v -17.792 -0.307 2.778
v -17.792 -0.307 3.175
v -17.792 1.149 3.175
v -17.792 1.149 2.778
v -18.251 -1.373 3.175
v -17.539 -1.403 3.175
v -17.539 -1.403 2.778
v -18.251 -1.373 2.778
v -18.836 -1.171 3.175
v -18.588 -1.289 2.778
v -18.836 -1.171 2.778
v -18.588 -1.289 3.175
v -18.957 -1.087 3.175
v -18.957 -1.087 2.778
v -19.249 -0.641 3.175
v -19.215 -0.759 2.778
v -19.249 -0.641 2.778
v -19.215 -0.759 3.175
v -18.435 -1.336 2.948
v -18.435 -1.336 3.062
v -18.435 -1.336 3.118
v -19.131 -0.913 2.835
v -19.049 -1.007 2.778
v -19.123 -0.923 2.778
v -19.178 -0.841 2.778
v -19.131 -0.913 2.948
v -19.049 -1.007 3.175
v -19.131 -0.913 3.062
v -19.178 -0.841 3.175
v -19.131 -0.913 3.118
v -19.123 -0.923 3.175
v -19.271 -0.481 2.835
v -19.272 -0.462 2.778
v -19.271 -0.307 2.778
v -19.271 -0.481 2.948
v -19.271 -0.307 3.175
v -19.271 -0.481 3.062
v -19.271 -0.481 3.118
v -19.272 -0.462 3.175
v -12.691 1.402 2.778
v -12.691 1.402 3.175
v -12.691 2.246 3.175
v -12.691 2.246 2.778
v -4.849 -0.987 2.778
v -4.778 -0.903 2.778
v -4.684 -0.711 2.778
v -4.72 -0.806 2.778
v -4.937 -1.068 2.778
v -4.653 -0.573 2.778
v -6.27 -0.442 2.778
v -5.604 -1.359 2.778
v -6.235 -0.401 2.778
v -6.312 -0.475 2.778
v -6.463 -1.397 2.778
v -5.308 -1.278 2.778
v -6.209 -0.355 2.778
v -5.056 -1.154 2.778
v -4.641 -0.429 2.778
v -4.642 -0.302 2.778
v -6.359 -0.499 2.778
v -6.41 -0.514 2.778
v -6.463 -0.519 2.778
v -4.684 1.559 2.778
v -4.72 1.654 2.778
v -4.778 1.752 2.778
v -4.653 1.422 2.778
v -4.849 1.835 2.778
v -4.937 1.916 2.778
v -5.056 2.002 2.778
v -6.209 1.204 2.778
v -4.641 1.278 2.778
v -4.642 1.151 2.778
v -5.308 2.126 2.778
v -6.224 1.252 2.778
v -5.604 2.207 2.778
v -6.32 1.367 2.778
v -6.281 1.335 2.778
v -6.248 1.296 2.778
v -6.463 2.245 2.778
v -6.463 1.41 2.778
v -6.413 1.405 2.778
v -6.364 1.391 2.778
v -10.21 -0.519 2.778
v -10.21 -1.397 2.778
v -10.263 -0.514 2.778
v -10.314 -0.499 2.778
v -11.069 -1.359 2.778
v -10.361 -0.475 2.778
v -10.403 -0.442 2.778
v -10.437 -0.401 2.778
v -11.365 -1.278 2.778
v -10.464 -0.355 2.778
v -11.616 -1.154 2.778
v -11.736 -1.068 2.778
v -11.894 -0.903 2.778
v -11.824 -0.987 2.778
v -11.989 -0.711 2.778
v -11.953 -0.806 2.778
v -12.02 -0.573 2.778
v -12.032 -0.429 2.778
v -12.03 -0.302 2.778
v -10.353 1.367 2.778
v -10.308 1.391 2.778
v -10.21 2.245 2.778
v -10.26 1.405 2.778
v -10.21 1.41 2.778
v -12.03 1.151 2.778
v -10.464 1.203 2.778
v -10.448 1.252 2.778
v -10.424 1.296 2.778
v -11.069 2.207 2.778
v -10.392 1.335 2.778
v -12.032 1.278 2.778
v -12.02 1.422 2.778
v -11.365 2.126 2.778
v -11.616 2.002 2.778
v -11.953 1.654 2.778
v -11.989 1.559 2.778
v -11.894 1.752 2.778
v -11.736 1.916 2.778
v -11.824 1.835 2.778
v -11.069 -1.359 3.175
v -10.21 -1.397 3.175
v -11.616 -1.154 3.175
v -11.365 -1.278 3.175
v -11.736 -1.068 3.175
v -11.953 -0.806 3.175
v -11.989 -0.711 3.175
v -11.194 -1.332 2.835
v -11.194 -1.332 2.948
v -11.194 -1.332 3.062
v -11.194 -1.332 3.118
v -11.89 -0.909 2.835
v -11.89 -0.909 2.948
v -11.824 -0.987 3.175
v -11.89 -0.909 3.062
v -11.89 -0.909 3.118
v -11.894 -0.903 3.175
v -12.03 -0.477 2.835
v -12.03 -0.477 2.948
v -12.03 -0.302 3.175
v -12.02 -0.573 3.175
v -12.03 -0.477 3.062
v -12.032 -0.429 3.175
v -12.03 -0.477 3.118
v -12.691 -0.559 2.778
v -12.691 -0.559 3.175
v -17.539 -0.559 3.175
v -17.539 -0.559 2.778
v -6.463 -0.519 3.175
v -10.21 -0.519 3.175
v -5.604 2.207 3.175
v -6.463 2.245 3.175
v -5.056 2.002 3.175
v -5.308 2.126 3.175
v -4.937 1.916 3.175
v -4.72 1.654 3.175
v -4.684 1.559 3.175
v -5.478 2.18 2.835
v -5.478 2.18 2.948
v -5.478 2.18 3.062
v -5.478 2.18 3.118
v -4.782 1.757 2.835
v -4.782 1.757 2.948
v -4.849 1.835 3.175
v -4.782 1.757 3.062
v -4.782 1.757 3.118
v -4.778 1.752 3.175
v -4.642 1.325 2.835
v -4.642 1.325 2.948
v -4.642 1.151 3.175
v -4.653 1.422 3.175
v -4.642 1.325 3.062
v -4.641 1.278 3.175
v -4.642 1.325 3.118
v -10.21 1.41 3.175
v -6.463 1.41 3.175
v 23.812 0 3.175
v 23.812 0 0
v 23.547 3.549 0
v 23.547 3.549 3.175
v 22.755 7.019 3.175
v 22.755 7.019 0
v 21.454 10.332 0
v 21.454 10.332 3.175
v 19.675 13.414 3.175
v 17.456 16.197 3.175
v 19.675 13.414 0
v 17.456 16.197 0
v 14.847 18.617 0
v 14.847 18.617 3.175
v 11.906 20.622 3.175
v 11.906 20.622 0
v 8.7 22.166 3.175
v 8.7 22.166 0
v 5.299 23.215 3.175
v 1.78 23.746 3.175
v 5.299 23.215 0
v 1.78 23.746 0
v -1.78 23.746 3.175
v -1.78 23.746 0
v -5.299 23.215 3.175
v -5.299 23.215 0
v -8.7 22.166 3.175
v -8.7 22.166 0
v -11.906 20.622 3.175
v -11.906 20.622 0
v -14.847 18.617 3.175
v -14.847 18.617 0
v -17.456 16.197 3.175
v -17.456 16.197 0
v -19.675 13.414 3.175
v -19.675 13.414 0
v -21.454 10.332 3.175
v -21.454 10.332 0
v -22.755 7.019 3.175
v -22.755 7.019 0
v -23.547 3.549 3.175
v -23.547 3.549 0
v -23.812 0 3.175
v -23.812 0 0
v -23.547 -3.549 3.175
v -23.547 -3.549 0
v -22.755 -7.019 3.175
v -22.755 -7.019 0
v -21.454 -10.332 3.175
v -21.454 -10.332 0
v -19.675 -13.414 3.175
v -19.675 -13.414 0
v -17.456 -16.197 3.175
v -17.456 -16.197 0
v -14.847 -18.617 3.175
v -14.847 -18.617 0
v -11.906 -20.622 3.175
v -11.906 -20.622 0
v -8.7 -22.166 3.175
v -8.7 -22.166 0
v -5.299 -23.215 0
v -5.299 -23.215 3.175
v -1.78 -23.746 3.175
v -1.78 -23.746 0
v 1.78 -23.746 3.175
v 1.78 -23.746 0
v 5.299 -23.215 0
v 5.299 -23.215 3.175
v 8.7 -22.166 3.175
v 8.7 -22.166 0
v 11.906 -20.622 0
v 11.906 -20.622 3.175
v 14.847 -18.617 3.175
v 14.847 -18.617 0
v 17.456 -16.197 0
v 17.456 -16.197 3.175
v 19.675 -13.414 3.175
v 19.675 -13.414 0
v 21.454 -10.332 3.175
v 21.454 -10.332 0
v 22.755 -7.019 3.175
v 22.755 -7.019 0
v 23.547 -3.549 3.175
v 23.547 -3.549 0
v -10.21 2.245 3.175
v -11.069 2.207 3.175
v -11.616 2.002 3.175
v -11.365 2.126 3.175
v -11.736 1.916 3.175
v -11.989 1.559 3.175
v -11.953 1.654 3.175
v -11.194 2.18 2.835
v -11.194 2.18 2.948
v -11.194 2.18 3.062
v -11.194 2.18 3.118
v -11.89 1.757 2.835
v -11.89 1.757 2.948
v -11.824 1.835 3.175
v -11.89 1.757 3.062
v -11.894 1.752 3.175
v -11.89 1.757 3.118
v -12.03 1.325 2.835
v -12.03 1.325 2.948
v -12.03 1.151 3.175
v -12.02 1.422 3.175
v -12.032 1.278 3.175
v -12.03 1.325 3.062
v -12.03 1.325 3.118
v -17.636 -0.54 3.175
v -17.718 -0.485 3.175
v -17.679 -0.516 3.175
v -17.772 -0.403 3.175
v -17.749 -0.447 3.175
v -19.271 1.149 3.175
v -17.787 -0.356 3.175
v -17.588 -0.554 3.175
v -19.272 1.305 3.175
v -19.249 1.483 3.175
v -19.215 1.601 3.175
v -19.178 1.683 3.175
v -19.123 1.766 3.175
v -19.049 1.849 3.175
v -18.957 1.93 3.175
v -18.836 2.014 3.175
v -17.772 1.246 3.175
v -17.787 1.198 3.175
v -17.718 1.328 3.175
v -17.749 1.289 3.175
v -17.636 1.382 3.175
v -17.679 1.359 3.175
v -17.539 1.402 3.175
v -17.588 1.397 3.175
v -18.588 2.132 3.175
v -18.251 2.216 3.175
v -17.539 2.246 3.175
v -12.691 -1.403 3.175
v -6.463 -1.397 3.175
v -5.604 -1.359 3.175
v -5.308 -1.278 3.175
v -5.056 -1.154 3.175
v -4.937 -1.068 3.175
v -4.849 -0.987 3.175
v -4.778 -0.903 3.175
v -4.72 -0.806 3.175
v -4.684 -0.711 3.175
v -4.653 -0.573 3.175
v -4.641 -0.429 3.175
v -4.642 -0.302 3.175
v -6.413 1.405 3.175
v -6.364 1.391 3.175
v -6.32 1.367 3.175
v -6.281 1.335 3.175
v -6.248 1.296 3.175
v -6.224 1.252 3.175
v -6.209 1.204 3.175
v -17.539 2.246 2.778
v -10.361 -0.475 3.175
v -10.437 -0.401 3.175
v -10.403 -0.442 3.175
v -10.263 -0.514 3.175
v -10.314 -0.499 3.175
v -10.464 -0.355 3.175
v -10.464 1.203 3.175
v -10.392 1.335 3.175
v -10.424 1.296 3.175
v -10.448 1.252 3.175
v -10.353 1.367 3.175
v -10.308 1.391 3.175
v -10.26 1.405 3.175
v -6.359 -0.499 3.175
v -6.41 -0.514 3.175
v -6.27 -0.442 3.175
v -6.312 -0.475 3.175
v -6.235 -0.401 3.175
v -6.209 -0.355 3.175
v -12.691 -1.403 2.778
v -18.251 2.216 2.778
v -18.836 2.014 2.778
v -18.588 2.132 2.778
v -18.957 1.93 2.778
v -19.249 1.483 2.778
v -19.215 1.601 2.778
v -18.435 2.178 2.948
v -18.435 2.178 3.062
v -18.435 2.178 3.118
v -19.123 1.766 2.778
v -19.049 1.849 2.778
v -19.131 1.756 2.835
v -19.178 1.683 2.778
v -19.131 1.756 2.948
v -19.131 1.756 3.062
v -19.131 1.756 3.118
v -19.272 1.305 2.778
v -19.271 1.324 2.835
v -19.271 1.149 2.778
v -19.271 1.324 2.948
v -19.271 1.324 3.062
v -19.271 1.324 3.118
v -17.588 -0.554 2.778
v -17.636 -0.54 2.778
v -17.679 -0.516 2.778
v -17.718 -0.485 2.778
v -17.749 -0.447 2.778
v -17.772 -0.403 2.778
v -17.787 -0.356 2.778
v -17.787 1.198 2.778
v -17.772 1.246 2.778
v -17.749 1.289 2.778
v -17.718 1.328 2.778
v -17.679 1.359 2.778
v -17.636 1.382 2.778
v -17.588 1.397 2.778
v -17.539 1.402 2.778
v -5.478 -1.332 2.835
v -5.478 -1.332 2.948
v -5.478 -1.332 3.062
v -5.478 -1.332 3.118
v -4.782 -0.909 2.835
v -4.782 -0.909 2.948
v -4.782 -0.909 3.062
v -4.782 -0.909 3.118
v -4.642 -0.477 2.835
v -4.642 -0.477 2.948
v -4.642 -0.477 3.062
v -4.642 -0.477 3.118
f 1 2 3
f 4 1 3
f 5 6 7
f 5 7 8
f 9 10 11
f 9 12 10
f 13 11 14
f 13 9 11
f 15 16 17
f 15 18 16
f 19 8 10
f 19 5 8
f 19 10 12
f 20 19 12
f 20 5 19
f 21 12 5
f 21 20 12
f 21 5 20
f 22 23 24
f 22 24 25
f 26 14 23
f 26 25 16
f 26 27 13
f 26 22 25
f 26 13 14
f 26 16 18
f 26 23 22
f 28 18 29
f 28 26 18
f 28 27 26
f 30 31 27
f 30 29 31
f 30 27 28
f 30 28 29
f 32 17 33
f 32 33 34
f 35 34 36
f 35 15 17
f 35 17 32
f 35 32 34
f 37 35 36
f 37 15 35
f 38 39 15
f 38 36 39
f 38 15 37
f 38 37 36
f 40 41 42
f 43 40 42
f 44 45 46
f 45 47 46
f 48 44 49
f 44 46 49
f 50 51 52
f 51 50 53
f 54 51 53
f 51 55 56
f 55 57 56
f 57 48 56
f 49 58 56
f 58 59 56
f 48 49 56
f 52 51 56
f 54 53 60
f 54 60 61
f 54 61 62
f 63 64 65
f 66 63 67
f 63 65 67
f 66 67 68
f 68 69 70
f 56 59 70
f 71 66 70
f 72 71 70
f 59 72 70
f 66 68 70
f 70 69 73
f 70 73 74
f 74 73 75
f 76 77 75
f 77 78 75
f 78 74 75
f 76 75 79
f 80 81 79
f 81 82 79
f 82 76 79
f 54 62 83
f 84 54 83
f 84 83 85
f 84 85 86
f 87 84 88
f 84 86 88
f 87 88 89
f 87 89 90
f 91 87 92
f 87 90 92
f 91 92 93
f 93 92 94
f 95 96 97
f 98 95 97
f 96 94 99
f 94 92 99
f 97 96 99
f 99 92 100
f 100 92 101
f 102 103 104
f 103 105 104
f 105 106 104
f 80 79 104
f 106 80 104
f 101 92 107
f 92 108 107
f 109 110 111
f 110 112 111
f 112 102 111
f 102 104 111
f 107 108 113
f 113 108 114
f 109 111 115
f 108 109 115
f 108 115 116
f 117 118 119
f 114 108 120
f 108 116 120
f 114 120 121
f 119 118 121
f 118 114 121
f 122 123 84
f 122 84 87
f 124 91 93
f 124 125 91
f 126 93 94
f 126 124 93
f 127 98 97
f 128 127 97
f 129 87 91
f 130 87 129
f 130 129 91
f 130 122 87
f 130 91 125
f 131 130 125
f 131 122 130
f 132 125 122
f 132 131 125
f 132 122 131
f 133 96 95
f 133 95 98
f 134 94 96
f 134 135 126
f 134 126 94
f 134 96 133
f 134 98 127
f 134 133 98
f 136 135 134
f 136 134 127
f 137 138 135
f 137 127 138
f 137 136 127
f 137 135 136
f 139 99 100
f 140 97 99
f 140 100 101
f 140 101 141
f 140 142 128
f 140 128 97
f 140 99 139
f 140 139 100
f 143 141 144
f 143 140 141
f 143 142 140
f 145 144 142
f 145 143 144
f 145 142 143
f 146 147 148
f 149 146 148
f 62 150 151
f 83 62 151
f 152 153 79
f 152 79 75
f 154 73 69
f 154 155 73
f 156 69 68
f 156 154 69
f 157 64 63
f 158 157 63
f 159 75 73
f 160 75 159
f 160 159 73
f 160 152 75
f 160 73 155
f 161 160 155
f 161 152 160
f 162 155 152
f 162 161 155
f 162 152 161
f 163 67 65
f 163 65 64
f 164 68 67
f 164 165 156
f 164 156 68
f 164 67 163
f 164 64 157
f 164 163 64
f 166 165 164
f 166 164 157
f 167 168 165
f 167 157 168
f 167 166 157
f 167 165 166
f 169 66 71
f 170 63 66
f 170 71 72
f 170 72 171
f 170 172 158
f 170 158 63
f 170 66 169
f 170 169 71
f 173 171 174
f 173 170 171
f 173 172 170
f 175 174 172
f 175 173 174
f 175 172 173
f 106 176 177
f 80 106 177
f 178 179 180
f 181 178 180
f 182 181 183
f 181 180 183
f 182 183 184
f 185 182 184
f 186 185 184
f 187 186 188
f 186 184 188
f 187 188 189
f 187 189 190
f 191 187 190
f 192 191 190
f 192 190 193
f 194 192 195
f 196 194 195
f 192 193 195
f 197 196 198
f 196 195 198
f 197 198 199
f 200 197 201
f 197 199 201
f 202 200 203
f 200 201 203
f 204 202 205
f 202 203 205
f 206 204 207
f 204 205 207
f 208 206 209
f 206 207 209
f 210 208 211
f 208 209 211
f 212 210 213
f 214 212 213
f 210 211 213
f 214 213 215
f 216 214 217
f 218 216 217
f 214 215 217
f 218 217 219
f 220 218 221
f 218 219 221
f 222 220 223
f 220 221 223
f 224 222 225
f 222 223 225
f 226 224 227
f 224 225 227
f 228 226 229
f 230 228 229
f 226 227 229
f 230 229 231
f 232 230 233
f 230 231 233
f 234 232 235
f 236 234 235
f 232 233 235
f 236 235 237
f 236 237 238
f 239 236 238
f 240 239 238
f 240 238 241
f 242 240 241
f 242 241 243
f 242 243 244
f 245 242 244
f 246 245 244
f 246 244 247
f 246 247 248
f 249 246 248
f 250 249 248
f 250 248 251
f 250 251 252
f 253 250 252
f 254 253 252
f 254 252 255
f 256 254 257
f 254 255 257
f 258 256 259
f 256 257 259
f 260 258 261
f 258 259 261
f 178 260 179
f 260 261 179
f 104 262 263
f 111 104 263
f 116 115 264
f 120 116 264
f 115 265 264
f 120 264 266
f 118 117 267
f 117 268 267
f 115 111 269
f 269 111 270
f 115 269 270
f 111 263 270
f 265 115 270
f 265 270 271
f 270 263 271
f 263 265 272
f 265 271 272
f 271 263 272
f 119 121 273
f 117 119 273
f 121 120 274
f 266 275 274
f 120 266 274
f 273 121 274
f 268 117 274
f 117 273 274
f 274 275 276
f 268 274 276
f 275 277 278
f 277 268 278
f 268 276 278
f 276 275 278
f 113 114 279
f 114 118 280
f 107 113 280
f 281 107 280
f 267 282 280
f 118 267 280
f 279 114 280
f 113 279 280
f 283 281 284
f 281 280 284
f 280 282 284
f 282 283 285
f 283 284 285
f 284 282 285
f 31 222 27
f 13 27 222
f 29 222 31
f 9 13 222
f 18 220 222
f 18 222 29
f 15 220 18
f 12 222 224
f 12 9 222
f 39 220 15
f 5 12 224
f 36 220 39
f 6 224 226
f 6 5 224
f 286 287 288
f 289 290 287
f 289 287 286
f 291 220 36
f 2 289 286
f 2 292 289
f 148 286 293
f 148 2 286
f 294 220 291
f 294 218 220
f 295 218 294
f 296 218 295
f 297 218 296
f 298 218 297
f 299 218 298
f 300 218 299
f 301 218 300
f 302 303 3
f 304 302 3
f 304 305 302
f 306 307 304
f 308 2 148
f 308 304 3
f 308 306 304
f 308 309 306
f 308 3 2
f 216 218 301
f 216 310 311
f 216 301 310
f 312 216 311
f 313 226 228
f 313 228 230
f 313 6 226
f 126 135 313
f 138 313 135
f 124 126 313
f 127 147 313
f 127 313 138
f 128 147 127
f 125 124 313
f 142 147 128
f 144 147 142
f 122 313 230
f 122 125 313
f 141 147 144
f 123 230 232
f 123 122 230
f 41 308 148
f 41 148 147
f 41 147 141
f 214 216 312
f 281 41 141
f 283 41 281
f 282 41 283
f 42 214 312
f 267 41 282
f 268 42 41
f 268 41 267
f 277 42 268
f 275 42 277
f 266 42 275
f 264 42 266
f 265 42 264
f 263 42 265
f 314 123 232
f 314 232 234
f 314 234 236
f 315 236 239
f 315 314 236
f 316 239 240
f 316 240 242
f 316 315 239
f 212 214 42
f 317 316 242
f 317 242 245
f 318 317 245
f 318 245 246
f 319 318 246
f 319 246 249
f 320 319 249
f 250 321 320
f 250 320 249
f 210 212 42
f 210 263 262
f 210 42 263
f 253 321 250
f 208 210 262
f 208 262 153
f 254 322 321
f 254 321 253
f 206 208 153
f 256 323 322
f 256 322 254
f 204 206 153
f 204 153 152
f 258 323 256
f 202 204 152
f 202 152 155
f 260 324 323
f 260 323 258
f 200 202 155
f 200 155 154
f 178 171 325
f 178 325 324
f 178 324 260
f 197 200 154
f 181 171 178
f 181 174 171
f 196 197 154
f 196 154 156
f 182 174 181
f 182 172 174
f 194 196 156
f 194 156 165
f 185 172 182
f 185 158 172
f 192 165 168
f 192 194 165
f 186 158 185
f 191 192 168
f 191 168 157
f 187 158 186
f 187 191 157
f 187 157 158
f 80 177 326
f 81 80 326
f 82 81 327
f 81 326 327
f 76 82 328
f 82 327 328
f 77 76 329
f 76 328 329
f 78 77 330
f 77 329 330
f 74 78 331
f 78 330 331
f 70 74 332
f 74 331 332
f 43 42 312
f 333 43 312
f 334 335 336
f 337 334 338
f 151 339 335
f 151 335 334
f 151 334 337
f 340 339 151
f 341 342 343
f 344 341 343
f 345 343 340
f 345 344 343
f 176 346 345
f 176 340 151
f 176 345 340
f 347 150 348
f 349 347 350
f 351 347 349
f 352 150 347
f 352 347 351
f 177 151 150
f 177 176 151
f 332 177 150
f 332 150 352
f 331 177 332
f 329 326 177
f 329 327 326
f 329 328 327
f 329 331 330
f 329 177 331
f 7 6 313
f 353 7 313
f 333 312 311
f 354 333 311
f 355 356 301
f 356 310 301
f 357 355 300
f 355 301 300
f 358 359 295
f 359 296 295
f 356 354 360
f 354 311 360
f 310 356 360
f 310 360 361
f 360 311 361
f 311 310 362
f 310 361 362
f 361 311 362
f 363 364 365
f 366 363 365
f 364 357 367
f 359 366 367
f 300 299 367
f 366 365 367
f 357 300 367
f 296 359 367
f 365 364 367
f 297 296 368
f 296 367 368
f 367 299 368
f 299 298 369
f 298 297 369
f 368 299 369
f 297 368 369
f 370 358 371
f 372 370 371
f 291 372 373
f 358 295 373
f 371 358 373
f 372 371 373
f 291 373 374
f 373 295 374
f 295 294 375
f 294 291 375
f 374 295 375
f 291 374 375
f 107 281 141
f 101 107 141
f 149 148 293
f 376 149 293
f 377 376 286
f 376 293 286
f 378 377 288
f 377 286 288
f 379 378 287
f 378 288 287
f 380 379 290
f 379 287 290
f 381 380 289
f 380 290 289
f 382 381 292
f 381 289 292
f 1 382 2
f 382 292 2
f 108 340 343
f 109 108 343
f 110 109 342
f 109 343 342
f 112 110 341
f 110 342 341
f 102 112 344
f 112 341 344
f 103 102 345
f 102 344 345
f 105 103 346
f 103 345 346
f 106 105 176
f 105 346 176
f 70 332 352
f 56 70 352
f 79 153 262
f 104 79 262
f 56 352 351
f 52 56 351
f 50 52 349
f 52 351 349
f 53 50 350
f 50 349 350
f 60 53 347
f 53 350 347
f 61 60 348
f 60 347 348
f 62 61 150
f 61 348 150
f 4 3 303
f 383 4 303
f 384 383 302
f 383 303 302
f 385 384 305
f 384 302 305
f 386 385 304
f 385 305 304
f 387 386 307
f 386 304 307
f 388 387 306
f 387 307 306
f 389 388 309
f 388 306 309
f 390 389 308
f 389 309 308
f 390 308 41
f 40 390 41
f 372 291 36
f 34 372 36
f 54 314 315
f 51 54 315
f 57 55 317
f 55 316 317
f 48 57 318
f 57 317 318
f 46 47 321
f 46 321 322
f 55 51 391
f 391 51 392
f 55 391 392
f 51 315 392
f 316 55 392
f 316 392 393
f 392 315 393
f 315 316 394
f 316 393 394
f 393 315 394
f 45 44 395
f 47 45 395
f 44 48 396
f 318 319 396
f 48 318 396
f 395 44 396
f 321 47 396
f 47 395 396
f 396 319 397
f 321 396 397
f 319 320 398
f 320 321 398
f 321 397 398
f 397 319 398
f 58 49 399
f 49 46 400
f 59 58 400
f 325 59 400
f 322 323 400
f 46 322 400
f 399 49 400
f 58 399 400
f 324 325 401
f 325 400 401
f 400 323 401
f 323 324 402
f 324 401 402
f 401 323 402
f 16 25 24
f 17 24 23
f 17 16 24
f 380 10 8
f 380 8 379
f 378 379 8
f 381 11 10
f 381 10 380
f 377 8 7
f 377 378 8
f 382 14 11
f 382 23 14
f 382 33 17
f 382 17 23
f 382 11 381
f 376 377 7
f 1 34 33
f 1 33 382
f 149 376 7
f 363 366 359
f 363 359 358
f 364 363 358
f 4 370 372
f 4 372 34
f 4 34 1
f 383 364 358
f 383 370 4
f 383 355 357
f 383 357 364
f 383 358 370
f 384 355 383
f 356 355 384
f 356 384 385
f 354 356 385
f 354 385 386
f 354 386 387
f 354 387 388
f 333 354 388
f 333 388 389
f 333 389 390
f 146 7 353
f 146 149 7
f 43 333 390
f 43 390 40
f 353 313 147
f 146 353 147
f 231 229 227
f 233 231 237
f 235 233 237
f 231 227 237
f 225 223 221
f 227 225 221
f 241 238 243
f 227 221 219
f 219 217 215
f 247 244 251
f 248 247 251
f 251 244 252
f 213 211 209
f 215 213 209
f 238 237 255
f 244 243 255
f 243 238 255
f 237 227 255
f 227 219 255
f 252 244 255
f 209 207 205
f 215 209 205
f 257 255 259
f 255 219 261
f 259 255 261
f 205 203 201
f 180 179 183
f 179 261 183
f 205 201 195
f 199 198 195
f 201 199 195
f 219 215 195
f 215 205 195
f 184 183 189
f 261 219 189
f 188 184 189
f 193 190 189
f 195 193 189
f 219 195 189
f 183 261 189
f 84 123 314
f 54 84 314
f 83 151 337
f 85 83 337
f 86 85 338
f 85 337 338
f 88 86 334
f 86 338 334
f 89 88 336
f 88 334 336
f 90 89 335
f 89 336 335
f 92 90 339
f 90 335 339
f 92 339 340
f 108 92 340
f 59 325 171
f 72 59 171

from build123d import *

# Parameters (mm, degrees)
F0_R     = 23.8125
F1_DEPTH = 3.175
F3_DEPTH = 0.396875
F5_DEPTH = 0.396875


with BuildPart() as f1:
    # F0 (on Top) → F1 (new body)
    with BuildSketch(Plane.XY):
        Circle(F0_R)
    extrude(amount=F1_DEPTH)

    # F2 (on face) → F3 (cut)
    with BuildSketch(Plane.XY.offset(3.175)):
        with BuildLine():
            Line((-12.6909213141, 1.4016369823), (-12.6909213141, 2.2456407605))
            Line((-12.6909213141, 2.2456407605), (-17.5391789526, 2.2456407605))
            add(Edge.make_bspline(
                [(-17.5391789526, 2.2456407605), (-17.6559062181, 2.2476718851), (-17.9354688339, 2.2554253264), (-18.4402822828, 2.2027182518), (-18.8679220579, 2.0222176003), (-19.1434560116, 1.7706610474), (-19.239281151, 1.5597691872), (-19.2786330359, 1.3259163628), (-19.2712876113, 1.2030485875), (-19.2709770054, 1.1491293553)],
                knots=[0, 0, 0, 0, 0.1560804266, 0.3350119598, 0.5061176479, 0.6557447948, 0.7748919756, 0.8954698873, 1, 1, 1, 1], degree=3))
            Line((-19.2709770054, 1.1491293553), (-19.2709770054, -0.3065037017))
            add(Edge.make_bspline(
                [(-17.5391789526, -1.4030151069), (-17.6559062181, -1.4050462315), (-17.9354688339, -1.4127996728), (-18.4402822828, -1.3600925982), (-18.8679220579, -1.1795919467), (-19.1434560116, -0.9280353938), (-19.239281151, -0.7171435336), (-19.2786330359, -0.4832907092), (-19.2712876113, -0.3604229339), (-19.2709770054, -0.3065037017)],
                knots=[0, 0, 0, 0, 0.1560804266, 0.3350119598, 0.5061176479, 0.6557447948, 0.7748919756, 0.8954698873, 1, 1, 1, 1], degree=3))
            Line((-17.5391789526, -1.4030151069), (-12.6909213141, -1.4030151069))
            Line((-12.6909213141, -1.4030151069), (-12.6909213141, -0.5590113287))
            Line((-12.6909213141, -0.5590113287), (-17.5391789526, -0.5590113287))
            ThreePointArc((-17.5391789526, -0.5590113287), (-17.7177288079, -0.4850535571), (-17.7916865796, -0.3065037017))
            Line((-17.7916865796, -0.3065037017), (-17.7916865796, 1.1491293553))
            ThreePointArc((-17.7916865796, 1.1491293553), (-17.7177288079, 1.3276792107), (-17.5391789526, 1.4016369823))
            Line((-17.5391789526, 1.4016369823), (-12.6909213141, 1.4016369823))
        make_face()
    extrude(amount=-F3_DEPTH, mode=Mode.SUBTRACT)

    # F4 (on face) → F5 (cut)
    with BuildSketch(Plane.XY.offset(3.175)):
        with BuildLine():
            add(Edge.make_bspline(
                [(-6.4630292664, 2.2452620324), (-6.333486021, 2.2475161627), (-5.9516659265, 2.2519011177), (-5.480629737, 2.2050980583), (-5.0429762822, 2.0234611453), (-4.7702874415, 1.7724714993), (-4.673882058, 1.5612964459), (-4.6346702869, 1.3280855562), (-4.6419952443, 1.2038344916), (-4.6423006894, 1.1508111508)],
                knots=[0, 0, 0, 0, 0.1732171564, 0.3460610241, 0.5143237171, 0.6614647441, 0.7786322429, 0.8972067004, 1, 1, 1, 1], degree=3))
            Line((-6.4630292664, 2.2452620324), (-10.2095292664, 2.2452620324))
            add(Edge.make_bspline(
                [(-10.2095292664, 2.2452620324), (-10.3390725118, 2.2475161627), (-10.7208926063, 2.2519011177), (-11.1919287958, 2.2050980583), (-11.6295822506, 2.0234611453), (-11.9022710913, 1.7724714993), (-11.9986764749, 1.5612964459), (-12.0378882459, 1.3280855562), (-12.0305632885, 1.2038344916), (-12.0302578434, 1.1508111508)],
                knots=[0, 0, 0, 0, 0.1732171564, 0.3460610241, 0.5143237171, 0.6614647441, 0.7786322429, 0.8972067004, 1, 1, 1, 1], degree=3))
            Line((-12.0302578434, 1.1508111508), (-12.0302578434, -0.3022970803))
            add(Edge.make_bspline(
                [(-10.2095292664, -1.3967479619), (-10.3390725118, -1.3990020922), (-10.7208926063, -1.4033870472), (-11.1919287958, -1.3565839878), (-11.6295822506, -1.1749470748), (-11.9022710913, -0.9239574288), (-11.9986764749, -0.7127823754), (-12.0378882459, -0.4795714857), (-12.0305632885, -0.3553204211), (-12.0302578434, -0.3022970803)],
                knots=[0, 0, 0, 0, 0.1732171564, 0.3460610241, 0.5143237171, 0.6614647441, 0.7786322429, 0.8972067004, 1, 1, 1, 1], degree=3))
            Line((-10.2095292664, -1.3967479619), (-6.4630292664, -1.3967479619))
            add(Edge.make_bspline(
                [(-6.4630292664, -1.3967479619), (-6.333486021, -1.3990020922), (-5.9516659265, -1.4033870472), (-5.480629737, -1.3565839878), (-5.0429762822, -1.1749470748), (-4.7702874415, -0.9239574288), (-4.673882058, -0.7127823754), (-4.6346702869, -0.4795714857), (-4.6419952443, -0.3553204211), (-4.6423006894, -0.3022970803)],
                knots=[0, 0, 0, 0, 0.1732171564, 0.3460610241, 0.5143237171, 0.6614647441, 0.7786322429, 0.8972067004, 1, 1, 1, 1], degree=3))
            Line((-4.6423006894, -0.3022970803), (-4.6423006894, 1.1508111508))
        make_face()
        with BuildLine():
            ThreePointArc((-10.4635292664, 1.2034273241), (-10.3732916273, 1.3519736494), (-10.2095292664, 1.4102036366))
            Line((-10.2095292664, 1.4102036366), (-6.4630292664, 1.4102036366))
            ThreePointArc((-6.4630292664, 1.4102036366), (-6.2994040409, 1.3521173307), (-6.2090292664, 1.2038620324))
            Line((-6.2090292664, 1.2038620324), (-6.2090292664, -0.3553479619))
            ThreePointArc((-6.2090292664, -0.3553479619), (-6.3117594773, -0.47474039), (-6.4628336175, -0.519289826))
            Line((-6.4628336175, -0.519289826), (-10.2095292664, -0.519289826))
            ThreePointArc((-10.2095292664, -0.519289826), (-10.3608035682, -0.4746109766), (-10.4635292664, -0.3549132536))
            Line((-10.4635292664, -0.3549132536), (-10.4635292664, 1.2034273241))
        make_face(mode=Mode.SUBTRACT)
    extrude(amount=-F5_DEPTH, mode=Mode.SUBTRACT)


solid = f1.part
